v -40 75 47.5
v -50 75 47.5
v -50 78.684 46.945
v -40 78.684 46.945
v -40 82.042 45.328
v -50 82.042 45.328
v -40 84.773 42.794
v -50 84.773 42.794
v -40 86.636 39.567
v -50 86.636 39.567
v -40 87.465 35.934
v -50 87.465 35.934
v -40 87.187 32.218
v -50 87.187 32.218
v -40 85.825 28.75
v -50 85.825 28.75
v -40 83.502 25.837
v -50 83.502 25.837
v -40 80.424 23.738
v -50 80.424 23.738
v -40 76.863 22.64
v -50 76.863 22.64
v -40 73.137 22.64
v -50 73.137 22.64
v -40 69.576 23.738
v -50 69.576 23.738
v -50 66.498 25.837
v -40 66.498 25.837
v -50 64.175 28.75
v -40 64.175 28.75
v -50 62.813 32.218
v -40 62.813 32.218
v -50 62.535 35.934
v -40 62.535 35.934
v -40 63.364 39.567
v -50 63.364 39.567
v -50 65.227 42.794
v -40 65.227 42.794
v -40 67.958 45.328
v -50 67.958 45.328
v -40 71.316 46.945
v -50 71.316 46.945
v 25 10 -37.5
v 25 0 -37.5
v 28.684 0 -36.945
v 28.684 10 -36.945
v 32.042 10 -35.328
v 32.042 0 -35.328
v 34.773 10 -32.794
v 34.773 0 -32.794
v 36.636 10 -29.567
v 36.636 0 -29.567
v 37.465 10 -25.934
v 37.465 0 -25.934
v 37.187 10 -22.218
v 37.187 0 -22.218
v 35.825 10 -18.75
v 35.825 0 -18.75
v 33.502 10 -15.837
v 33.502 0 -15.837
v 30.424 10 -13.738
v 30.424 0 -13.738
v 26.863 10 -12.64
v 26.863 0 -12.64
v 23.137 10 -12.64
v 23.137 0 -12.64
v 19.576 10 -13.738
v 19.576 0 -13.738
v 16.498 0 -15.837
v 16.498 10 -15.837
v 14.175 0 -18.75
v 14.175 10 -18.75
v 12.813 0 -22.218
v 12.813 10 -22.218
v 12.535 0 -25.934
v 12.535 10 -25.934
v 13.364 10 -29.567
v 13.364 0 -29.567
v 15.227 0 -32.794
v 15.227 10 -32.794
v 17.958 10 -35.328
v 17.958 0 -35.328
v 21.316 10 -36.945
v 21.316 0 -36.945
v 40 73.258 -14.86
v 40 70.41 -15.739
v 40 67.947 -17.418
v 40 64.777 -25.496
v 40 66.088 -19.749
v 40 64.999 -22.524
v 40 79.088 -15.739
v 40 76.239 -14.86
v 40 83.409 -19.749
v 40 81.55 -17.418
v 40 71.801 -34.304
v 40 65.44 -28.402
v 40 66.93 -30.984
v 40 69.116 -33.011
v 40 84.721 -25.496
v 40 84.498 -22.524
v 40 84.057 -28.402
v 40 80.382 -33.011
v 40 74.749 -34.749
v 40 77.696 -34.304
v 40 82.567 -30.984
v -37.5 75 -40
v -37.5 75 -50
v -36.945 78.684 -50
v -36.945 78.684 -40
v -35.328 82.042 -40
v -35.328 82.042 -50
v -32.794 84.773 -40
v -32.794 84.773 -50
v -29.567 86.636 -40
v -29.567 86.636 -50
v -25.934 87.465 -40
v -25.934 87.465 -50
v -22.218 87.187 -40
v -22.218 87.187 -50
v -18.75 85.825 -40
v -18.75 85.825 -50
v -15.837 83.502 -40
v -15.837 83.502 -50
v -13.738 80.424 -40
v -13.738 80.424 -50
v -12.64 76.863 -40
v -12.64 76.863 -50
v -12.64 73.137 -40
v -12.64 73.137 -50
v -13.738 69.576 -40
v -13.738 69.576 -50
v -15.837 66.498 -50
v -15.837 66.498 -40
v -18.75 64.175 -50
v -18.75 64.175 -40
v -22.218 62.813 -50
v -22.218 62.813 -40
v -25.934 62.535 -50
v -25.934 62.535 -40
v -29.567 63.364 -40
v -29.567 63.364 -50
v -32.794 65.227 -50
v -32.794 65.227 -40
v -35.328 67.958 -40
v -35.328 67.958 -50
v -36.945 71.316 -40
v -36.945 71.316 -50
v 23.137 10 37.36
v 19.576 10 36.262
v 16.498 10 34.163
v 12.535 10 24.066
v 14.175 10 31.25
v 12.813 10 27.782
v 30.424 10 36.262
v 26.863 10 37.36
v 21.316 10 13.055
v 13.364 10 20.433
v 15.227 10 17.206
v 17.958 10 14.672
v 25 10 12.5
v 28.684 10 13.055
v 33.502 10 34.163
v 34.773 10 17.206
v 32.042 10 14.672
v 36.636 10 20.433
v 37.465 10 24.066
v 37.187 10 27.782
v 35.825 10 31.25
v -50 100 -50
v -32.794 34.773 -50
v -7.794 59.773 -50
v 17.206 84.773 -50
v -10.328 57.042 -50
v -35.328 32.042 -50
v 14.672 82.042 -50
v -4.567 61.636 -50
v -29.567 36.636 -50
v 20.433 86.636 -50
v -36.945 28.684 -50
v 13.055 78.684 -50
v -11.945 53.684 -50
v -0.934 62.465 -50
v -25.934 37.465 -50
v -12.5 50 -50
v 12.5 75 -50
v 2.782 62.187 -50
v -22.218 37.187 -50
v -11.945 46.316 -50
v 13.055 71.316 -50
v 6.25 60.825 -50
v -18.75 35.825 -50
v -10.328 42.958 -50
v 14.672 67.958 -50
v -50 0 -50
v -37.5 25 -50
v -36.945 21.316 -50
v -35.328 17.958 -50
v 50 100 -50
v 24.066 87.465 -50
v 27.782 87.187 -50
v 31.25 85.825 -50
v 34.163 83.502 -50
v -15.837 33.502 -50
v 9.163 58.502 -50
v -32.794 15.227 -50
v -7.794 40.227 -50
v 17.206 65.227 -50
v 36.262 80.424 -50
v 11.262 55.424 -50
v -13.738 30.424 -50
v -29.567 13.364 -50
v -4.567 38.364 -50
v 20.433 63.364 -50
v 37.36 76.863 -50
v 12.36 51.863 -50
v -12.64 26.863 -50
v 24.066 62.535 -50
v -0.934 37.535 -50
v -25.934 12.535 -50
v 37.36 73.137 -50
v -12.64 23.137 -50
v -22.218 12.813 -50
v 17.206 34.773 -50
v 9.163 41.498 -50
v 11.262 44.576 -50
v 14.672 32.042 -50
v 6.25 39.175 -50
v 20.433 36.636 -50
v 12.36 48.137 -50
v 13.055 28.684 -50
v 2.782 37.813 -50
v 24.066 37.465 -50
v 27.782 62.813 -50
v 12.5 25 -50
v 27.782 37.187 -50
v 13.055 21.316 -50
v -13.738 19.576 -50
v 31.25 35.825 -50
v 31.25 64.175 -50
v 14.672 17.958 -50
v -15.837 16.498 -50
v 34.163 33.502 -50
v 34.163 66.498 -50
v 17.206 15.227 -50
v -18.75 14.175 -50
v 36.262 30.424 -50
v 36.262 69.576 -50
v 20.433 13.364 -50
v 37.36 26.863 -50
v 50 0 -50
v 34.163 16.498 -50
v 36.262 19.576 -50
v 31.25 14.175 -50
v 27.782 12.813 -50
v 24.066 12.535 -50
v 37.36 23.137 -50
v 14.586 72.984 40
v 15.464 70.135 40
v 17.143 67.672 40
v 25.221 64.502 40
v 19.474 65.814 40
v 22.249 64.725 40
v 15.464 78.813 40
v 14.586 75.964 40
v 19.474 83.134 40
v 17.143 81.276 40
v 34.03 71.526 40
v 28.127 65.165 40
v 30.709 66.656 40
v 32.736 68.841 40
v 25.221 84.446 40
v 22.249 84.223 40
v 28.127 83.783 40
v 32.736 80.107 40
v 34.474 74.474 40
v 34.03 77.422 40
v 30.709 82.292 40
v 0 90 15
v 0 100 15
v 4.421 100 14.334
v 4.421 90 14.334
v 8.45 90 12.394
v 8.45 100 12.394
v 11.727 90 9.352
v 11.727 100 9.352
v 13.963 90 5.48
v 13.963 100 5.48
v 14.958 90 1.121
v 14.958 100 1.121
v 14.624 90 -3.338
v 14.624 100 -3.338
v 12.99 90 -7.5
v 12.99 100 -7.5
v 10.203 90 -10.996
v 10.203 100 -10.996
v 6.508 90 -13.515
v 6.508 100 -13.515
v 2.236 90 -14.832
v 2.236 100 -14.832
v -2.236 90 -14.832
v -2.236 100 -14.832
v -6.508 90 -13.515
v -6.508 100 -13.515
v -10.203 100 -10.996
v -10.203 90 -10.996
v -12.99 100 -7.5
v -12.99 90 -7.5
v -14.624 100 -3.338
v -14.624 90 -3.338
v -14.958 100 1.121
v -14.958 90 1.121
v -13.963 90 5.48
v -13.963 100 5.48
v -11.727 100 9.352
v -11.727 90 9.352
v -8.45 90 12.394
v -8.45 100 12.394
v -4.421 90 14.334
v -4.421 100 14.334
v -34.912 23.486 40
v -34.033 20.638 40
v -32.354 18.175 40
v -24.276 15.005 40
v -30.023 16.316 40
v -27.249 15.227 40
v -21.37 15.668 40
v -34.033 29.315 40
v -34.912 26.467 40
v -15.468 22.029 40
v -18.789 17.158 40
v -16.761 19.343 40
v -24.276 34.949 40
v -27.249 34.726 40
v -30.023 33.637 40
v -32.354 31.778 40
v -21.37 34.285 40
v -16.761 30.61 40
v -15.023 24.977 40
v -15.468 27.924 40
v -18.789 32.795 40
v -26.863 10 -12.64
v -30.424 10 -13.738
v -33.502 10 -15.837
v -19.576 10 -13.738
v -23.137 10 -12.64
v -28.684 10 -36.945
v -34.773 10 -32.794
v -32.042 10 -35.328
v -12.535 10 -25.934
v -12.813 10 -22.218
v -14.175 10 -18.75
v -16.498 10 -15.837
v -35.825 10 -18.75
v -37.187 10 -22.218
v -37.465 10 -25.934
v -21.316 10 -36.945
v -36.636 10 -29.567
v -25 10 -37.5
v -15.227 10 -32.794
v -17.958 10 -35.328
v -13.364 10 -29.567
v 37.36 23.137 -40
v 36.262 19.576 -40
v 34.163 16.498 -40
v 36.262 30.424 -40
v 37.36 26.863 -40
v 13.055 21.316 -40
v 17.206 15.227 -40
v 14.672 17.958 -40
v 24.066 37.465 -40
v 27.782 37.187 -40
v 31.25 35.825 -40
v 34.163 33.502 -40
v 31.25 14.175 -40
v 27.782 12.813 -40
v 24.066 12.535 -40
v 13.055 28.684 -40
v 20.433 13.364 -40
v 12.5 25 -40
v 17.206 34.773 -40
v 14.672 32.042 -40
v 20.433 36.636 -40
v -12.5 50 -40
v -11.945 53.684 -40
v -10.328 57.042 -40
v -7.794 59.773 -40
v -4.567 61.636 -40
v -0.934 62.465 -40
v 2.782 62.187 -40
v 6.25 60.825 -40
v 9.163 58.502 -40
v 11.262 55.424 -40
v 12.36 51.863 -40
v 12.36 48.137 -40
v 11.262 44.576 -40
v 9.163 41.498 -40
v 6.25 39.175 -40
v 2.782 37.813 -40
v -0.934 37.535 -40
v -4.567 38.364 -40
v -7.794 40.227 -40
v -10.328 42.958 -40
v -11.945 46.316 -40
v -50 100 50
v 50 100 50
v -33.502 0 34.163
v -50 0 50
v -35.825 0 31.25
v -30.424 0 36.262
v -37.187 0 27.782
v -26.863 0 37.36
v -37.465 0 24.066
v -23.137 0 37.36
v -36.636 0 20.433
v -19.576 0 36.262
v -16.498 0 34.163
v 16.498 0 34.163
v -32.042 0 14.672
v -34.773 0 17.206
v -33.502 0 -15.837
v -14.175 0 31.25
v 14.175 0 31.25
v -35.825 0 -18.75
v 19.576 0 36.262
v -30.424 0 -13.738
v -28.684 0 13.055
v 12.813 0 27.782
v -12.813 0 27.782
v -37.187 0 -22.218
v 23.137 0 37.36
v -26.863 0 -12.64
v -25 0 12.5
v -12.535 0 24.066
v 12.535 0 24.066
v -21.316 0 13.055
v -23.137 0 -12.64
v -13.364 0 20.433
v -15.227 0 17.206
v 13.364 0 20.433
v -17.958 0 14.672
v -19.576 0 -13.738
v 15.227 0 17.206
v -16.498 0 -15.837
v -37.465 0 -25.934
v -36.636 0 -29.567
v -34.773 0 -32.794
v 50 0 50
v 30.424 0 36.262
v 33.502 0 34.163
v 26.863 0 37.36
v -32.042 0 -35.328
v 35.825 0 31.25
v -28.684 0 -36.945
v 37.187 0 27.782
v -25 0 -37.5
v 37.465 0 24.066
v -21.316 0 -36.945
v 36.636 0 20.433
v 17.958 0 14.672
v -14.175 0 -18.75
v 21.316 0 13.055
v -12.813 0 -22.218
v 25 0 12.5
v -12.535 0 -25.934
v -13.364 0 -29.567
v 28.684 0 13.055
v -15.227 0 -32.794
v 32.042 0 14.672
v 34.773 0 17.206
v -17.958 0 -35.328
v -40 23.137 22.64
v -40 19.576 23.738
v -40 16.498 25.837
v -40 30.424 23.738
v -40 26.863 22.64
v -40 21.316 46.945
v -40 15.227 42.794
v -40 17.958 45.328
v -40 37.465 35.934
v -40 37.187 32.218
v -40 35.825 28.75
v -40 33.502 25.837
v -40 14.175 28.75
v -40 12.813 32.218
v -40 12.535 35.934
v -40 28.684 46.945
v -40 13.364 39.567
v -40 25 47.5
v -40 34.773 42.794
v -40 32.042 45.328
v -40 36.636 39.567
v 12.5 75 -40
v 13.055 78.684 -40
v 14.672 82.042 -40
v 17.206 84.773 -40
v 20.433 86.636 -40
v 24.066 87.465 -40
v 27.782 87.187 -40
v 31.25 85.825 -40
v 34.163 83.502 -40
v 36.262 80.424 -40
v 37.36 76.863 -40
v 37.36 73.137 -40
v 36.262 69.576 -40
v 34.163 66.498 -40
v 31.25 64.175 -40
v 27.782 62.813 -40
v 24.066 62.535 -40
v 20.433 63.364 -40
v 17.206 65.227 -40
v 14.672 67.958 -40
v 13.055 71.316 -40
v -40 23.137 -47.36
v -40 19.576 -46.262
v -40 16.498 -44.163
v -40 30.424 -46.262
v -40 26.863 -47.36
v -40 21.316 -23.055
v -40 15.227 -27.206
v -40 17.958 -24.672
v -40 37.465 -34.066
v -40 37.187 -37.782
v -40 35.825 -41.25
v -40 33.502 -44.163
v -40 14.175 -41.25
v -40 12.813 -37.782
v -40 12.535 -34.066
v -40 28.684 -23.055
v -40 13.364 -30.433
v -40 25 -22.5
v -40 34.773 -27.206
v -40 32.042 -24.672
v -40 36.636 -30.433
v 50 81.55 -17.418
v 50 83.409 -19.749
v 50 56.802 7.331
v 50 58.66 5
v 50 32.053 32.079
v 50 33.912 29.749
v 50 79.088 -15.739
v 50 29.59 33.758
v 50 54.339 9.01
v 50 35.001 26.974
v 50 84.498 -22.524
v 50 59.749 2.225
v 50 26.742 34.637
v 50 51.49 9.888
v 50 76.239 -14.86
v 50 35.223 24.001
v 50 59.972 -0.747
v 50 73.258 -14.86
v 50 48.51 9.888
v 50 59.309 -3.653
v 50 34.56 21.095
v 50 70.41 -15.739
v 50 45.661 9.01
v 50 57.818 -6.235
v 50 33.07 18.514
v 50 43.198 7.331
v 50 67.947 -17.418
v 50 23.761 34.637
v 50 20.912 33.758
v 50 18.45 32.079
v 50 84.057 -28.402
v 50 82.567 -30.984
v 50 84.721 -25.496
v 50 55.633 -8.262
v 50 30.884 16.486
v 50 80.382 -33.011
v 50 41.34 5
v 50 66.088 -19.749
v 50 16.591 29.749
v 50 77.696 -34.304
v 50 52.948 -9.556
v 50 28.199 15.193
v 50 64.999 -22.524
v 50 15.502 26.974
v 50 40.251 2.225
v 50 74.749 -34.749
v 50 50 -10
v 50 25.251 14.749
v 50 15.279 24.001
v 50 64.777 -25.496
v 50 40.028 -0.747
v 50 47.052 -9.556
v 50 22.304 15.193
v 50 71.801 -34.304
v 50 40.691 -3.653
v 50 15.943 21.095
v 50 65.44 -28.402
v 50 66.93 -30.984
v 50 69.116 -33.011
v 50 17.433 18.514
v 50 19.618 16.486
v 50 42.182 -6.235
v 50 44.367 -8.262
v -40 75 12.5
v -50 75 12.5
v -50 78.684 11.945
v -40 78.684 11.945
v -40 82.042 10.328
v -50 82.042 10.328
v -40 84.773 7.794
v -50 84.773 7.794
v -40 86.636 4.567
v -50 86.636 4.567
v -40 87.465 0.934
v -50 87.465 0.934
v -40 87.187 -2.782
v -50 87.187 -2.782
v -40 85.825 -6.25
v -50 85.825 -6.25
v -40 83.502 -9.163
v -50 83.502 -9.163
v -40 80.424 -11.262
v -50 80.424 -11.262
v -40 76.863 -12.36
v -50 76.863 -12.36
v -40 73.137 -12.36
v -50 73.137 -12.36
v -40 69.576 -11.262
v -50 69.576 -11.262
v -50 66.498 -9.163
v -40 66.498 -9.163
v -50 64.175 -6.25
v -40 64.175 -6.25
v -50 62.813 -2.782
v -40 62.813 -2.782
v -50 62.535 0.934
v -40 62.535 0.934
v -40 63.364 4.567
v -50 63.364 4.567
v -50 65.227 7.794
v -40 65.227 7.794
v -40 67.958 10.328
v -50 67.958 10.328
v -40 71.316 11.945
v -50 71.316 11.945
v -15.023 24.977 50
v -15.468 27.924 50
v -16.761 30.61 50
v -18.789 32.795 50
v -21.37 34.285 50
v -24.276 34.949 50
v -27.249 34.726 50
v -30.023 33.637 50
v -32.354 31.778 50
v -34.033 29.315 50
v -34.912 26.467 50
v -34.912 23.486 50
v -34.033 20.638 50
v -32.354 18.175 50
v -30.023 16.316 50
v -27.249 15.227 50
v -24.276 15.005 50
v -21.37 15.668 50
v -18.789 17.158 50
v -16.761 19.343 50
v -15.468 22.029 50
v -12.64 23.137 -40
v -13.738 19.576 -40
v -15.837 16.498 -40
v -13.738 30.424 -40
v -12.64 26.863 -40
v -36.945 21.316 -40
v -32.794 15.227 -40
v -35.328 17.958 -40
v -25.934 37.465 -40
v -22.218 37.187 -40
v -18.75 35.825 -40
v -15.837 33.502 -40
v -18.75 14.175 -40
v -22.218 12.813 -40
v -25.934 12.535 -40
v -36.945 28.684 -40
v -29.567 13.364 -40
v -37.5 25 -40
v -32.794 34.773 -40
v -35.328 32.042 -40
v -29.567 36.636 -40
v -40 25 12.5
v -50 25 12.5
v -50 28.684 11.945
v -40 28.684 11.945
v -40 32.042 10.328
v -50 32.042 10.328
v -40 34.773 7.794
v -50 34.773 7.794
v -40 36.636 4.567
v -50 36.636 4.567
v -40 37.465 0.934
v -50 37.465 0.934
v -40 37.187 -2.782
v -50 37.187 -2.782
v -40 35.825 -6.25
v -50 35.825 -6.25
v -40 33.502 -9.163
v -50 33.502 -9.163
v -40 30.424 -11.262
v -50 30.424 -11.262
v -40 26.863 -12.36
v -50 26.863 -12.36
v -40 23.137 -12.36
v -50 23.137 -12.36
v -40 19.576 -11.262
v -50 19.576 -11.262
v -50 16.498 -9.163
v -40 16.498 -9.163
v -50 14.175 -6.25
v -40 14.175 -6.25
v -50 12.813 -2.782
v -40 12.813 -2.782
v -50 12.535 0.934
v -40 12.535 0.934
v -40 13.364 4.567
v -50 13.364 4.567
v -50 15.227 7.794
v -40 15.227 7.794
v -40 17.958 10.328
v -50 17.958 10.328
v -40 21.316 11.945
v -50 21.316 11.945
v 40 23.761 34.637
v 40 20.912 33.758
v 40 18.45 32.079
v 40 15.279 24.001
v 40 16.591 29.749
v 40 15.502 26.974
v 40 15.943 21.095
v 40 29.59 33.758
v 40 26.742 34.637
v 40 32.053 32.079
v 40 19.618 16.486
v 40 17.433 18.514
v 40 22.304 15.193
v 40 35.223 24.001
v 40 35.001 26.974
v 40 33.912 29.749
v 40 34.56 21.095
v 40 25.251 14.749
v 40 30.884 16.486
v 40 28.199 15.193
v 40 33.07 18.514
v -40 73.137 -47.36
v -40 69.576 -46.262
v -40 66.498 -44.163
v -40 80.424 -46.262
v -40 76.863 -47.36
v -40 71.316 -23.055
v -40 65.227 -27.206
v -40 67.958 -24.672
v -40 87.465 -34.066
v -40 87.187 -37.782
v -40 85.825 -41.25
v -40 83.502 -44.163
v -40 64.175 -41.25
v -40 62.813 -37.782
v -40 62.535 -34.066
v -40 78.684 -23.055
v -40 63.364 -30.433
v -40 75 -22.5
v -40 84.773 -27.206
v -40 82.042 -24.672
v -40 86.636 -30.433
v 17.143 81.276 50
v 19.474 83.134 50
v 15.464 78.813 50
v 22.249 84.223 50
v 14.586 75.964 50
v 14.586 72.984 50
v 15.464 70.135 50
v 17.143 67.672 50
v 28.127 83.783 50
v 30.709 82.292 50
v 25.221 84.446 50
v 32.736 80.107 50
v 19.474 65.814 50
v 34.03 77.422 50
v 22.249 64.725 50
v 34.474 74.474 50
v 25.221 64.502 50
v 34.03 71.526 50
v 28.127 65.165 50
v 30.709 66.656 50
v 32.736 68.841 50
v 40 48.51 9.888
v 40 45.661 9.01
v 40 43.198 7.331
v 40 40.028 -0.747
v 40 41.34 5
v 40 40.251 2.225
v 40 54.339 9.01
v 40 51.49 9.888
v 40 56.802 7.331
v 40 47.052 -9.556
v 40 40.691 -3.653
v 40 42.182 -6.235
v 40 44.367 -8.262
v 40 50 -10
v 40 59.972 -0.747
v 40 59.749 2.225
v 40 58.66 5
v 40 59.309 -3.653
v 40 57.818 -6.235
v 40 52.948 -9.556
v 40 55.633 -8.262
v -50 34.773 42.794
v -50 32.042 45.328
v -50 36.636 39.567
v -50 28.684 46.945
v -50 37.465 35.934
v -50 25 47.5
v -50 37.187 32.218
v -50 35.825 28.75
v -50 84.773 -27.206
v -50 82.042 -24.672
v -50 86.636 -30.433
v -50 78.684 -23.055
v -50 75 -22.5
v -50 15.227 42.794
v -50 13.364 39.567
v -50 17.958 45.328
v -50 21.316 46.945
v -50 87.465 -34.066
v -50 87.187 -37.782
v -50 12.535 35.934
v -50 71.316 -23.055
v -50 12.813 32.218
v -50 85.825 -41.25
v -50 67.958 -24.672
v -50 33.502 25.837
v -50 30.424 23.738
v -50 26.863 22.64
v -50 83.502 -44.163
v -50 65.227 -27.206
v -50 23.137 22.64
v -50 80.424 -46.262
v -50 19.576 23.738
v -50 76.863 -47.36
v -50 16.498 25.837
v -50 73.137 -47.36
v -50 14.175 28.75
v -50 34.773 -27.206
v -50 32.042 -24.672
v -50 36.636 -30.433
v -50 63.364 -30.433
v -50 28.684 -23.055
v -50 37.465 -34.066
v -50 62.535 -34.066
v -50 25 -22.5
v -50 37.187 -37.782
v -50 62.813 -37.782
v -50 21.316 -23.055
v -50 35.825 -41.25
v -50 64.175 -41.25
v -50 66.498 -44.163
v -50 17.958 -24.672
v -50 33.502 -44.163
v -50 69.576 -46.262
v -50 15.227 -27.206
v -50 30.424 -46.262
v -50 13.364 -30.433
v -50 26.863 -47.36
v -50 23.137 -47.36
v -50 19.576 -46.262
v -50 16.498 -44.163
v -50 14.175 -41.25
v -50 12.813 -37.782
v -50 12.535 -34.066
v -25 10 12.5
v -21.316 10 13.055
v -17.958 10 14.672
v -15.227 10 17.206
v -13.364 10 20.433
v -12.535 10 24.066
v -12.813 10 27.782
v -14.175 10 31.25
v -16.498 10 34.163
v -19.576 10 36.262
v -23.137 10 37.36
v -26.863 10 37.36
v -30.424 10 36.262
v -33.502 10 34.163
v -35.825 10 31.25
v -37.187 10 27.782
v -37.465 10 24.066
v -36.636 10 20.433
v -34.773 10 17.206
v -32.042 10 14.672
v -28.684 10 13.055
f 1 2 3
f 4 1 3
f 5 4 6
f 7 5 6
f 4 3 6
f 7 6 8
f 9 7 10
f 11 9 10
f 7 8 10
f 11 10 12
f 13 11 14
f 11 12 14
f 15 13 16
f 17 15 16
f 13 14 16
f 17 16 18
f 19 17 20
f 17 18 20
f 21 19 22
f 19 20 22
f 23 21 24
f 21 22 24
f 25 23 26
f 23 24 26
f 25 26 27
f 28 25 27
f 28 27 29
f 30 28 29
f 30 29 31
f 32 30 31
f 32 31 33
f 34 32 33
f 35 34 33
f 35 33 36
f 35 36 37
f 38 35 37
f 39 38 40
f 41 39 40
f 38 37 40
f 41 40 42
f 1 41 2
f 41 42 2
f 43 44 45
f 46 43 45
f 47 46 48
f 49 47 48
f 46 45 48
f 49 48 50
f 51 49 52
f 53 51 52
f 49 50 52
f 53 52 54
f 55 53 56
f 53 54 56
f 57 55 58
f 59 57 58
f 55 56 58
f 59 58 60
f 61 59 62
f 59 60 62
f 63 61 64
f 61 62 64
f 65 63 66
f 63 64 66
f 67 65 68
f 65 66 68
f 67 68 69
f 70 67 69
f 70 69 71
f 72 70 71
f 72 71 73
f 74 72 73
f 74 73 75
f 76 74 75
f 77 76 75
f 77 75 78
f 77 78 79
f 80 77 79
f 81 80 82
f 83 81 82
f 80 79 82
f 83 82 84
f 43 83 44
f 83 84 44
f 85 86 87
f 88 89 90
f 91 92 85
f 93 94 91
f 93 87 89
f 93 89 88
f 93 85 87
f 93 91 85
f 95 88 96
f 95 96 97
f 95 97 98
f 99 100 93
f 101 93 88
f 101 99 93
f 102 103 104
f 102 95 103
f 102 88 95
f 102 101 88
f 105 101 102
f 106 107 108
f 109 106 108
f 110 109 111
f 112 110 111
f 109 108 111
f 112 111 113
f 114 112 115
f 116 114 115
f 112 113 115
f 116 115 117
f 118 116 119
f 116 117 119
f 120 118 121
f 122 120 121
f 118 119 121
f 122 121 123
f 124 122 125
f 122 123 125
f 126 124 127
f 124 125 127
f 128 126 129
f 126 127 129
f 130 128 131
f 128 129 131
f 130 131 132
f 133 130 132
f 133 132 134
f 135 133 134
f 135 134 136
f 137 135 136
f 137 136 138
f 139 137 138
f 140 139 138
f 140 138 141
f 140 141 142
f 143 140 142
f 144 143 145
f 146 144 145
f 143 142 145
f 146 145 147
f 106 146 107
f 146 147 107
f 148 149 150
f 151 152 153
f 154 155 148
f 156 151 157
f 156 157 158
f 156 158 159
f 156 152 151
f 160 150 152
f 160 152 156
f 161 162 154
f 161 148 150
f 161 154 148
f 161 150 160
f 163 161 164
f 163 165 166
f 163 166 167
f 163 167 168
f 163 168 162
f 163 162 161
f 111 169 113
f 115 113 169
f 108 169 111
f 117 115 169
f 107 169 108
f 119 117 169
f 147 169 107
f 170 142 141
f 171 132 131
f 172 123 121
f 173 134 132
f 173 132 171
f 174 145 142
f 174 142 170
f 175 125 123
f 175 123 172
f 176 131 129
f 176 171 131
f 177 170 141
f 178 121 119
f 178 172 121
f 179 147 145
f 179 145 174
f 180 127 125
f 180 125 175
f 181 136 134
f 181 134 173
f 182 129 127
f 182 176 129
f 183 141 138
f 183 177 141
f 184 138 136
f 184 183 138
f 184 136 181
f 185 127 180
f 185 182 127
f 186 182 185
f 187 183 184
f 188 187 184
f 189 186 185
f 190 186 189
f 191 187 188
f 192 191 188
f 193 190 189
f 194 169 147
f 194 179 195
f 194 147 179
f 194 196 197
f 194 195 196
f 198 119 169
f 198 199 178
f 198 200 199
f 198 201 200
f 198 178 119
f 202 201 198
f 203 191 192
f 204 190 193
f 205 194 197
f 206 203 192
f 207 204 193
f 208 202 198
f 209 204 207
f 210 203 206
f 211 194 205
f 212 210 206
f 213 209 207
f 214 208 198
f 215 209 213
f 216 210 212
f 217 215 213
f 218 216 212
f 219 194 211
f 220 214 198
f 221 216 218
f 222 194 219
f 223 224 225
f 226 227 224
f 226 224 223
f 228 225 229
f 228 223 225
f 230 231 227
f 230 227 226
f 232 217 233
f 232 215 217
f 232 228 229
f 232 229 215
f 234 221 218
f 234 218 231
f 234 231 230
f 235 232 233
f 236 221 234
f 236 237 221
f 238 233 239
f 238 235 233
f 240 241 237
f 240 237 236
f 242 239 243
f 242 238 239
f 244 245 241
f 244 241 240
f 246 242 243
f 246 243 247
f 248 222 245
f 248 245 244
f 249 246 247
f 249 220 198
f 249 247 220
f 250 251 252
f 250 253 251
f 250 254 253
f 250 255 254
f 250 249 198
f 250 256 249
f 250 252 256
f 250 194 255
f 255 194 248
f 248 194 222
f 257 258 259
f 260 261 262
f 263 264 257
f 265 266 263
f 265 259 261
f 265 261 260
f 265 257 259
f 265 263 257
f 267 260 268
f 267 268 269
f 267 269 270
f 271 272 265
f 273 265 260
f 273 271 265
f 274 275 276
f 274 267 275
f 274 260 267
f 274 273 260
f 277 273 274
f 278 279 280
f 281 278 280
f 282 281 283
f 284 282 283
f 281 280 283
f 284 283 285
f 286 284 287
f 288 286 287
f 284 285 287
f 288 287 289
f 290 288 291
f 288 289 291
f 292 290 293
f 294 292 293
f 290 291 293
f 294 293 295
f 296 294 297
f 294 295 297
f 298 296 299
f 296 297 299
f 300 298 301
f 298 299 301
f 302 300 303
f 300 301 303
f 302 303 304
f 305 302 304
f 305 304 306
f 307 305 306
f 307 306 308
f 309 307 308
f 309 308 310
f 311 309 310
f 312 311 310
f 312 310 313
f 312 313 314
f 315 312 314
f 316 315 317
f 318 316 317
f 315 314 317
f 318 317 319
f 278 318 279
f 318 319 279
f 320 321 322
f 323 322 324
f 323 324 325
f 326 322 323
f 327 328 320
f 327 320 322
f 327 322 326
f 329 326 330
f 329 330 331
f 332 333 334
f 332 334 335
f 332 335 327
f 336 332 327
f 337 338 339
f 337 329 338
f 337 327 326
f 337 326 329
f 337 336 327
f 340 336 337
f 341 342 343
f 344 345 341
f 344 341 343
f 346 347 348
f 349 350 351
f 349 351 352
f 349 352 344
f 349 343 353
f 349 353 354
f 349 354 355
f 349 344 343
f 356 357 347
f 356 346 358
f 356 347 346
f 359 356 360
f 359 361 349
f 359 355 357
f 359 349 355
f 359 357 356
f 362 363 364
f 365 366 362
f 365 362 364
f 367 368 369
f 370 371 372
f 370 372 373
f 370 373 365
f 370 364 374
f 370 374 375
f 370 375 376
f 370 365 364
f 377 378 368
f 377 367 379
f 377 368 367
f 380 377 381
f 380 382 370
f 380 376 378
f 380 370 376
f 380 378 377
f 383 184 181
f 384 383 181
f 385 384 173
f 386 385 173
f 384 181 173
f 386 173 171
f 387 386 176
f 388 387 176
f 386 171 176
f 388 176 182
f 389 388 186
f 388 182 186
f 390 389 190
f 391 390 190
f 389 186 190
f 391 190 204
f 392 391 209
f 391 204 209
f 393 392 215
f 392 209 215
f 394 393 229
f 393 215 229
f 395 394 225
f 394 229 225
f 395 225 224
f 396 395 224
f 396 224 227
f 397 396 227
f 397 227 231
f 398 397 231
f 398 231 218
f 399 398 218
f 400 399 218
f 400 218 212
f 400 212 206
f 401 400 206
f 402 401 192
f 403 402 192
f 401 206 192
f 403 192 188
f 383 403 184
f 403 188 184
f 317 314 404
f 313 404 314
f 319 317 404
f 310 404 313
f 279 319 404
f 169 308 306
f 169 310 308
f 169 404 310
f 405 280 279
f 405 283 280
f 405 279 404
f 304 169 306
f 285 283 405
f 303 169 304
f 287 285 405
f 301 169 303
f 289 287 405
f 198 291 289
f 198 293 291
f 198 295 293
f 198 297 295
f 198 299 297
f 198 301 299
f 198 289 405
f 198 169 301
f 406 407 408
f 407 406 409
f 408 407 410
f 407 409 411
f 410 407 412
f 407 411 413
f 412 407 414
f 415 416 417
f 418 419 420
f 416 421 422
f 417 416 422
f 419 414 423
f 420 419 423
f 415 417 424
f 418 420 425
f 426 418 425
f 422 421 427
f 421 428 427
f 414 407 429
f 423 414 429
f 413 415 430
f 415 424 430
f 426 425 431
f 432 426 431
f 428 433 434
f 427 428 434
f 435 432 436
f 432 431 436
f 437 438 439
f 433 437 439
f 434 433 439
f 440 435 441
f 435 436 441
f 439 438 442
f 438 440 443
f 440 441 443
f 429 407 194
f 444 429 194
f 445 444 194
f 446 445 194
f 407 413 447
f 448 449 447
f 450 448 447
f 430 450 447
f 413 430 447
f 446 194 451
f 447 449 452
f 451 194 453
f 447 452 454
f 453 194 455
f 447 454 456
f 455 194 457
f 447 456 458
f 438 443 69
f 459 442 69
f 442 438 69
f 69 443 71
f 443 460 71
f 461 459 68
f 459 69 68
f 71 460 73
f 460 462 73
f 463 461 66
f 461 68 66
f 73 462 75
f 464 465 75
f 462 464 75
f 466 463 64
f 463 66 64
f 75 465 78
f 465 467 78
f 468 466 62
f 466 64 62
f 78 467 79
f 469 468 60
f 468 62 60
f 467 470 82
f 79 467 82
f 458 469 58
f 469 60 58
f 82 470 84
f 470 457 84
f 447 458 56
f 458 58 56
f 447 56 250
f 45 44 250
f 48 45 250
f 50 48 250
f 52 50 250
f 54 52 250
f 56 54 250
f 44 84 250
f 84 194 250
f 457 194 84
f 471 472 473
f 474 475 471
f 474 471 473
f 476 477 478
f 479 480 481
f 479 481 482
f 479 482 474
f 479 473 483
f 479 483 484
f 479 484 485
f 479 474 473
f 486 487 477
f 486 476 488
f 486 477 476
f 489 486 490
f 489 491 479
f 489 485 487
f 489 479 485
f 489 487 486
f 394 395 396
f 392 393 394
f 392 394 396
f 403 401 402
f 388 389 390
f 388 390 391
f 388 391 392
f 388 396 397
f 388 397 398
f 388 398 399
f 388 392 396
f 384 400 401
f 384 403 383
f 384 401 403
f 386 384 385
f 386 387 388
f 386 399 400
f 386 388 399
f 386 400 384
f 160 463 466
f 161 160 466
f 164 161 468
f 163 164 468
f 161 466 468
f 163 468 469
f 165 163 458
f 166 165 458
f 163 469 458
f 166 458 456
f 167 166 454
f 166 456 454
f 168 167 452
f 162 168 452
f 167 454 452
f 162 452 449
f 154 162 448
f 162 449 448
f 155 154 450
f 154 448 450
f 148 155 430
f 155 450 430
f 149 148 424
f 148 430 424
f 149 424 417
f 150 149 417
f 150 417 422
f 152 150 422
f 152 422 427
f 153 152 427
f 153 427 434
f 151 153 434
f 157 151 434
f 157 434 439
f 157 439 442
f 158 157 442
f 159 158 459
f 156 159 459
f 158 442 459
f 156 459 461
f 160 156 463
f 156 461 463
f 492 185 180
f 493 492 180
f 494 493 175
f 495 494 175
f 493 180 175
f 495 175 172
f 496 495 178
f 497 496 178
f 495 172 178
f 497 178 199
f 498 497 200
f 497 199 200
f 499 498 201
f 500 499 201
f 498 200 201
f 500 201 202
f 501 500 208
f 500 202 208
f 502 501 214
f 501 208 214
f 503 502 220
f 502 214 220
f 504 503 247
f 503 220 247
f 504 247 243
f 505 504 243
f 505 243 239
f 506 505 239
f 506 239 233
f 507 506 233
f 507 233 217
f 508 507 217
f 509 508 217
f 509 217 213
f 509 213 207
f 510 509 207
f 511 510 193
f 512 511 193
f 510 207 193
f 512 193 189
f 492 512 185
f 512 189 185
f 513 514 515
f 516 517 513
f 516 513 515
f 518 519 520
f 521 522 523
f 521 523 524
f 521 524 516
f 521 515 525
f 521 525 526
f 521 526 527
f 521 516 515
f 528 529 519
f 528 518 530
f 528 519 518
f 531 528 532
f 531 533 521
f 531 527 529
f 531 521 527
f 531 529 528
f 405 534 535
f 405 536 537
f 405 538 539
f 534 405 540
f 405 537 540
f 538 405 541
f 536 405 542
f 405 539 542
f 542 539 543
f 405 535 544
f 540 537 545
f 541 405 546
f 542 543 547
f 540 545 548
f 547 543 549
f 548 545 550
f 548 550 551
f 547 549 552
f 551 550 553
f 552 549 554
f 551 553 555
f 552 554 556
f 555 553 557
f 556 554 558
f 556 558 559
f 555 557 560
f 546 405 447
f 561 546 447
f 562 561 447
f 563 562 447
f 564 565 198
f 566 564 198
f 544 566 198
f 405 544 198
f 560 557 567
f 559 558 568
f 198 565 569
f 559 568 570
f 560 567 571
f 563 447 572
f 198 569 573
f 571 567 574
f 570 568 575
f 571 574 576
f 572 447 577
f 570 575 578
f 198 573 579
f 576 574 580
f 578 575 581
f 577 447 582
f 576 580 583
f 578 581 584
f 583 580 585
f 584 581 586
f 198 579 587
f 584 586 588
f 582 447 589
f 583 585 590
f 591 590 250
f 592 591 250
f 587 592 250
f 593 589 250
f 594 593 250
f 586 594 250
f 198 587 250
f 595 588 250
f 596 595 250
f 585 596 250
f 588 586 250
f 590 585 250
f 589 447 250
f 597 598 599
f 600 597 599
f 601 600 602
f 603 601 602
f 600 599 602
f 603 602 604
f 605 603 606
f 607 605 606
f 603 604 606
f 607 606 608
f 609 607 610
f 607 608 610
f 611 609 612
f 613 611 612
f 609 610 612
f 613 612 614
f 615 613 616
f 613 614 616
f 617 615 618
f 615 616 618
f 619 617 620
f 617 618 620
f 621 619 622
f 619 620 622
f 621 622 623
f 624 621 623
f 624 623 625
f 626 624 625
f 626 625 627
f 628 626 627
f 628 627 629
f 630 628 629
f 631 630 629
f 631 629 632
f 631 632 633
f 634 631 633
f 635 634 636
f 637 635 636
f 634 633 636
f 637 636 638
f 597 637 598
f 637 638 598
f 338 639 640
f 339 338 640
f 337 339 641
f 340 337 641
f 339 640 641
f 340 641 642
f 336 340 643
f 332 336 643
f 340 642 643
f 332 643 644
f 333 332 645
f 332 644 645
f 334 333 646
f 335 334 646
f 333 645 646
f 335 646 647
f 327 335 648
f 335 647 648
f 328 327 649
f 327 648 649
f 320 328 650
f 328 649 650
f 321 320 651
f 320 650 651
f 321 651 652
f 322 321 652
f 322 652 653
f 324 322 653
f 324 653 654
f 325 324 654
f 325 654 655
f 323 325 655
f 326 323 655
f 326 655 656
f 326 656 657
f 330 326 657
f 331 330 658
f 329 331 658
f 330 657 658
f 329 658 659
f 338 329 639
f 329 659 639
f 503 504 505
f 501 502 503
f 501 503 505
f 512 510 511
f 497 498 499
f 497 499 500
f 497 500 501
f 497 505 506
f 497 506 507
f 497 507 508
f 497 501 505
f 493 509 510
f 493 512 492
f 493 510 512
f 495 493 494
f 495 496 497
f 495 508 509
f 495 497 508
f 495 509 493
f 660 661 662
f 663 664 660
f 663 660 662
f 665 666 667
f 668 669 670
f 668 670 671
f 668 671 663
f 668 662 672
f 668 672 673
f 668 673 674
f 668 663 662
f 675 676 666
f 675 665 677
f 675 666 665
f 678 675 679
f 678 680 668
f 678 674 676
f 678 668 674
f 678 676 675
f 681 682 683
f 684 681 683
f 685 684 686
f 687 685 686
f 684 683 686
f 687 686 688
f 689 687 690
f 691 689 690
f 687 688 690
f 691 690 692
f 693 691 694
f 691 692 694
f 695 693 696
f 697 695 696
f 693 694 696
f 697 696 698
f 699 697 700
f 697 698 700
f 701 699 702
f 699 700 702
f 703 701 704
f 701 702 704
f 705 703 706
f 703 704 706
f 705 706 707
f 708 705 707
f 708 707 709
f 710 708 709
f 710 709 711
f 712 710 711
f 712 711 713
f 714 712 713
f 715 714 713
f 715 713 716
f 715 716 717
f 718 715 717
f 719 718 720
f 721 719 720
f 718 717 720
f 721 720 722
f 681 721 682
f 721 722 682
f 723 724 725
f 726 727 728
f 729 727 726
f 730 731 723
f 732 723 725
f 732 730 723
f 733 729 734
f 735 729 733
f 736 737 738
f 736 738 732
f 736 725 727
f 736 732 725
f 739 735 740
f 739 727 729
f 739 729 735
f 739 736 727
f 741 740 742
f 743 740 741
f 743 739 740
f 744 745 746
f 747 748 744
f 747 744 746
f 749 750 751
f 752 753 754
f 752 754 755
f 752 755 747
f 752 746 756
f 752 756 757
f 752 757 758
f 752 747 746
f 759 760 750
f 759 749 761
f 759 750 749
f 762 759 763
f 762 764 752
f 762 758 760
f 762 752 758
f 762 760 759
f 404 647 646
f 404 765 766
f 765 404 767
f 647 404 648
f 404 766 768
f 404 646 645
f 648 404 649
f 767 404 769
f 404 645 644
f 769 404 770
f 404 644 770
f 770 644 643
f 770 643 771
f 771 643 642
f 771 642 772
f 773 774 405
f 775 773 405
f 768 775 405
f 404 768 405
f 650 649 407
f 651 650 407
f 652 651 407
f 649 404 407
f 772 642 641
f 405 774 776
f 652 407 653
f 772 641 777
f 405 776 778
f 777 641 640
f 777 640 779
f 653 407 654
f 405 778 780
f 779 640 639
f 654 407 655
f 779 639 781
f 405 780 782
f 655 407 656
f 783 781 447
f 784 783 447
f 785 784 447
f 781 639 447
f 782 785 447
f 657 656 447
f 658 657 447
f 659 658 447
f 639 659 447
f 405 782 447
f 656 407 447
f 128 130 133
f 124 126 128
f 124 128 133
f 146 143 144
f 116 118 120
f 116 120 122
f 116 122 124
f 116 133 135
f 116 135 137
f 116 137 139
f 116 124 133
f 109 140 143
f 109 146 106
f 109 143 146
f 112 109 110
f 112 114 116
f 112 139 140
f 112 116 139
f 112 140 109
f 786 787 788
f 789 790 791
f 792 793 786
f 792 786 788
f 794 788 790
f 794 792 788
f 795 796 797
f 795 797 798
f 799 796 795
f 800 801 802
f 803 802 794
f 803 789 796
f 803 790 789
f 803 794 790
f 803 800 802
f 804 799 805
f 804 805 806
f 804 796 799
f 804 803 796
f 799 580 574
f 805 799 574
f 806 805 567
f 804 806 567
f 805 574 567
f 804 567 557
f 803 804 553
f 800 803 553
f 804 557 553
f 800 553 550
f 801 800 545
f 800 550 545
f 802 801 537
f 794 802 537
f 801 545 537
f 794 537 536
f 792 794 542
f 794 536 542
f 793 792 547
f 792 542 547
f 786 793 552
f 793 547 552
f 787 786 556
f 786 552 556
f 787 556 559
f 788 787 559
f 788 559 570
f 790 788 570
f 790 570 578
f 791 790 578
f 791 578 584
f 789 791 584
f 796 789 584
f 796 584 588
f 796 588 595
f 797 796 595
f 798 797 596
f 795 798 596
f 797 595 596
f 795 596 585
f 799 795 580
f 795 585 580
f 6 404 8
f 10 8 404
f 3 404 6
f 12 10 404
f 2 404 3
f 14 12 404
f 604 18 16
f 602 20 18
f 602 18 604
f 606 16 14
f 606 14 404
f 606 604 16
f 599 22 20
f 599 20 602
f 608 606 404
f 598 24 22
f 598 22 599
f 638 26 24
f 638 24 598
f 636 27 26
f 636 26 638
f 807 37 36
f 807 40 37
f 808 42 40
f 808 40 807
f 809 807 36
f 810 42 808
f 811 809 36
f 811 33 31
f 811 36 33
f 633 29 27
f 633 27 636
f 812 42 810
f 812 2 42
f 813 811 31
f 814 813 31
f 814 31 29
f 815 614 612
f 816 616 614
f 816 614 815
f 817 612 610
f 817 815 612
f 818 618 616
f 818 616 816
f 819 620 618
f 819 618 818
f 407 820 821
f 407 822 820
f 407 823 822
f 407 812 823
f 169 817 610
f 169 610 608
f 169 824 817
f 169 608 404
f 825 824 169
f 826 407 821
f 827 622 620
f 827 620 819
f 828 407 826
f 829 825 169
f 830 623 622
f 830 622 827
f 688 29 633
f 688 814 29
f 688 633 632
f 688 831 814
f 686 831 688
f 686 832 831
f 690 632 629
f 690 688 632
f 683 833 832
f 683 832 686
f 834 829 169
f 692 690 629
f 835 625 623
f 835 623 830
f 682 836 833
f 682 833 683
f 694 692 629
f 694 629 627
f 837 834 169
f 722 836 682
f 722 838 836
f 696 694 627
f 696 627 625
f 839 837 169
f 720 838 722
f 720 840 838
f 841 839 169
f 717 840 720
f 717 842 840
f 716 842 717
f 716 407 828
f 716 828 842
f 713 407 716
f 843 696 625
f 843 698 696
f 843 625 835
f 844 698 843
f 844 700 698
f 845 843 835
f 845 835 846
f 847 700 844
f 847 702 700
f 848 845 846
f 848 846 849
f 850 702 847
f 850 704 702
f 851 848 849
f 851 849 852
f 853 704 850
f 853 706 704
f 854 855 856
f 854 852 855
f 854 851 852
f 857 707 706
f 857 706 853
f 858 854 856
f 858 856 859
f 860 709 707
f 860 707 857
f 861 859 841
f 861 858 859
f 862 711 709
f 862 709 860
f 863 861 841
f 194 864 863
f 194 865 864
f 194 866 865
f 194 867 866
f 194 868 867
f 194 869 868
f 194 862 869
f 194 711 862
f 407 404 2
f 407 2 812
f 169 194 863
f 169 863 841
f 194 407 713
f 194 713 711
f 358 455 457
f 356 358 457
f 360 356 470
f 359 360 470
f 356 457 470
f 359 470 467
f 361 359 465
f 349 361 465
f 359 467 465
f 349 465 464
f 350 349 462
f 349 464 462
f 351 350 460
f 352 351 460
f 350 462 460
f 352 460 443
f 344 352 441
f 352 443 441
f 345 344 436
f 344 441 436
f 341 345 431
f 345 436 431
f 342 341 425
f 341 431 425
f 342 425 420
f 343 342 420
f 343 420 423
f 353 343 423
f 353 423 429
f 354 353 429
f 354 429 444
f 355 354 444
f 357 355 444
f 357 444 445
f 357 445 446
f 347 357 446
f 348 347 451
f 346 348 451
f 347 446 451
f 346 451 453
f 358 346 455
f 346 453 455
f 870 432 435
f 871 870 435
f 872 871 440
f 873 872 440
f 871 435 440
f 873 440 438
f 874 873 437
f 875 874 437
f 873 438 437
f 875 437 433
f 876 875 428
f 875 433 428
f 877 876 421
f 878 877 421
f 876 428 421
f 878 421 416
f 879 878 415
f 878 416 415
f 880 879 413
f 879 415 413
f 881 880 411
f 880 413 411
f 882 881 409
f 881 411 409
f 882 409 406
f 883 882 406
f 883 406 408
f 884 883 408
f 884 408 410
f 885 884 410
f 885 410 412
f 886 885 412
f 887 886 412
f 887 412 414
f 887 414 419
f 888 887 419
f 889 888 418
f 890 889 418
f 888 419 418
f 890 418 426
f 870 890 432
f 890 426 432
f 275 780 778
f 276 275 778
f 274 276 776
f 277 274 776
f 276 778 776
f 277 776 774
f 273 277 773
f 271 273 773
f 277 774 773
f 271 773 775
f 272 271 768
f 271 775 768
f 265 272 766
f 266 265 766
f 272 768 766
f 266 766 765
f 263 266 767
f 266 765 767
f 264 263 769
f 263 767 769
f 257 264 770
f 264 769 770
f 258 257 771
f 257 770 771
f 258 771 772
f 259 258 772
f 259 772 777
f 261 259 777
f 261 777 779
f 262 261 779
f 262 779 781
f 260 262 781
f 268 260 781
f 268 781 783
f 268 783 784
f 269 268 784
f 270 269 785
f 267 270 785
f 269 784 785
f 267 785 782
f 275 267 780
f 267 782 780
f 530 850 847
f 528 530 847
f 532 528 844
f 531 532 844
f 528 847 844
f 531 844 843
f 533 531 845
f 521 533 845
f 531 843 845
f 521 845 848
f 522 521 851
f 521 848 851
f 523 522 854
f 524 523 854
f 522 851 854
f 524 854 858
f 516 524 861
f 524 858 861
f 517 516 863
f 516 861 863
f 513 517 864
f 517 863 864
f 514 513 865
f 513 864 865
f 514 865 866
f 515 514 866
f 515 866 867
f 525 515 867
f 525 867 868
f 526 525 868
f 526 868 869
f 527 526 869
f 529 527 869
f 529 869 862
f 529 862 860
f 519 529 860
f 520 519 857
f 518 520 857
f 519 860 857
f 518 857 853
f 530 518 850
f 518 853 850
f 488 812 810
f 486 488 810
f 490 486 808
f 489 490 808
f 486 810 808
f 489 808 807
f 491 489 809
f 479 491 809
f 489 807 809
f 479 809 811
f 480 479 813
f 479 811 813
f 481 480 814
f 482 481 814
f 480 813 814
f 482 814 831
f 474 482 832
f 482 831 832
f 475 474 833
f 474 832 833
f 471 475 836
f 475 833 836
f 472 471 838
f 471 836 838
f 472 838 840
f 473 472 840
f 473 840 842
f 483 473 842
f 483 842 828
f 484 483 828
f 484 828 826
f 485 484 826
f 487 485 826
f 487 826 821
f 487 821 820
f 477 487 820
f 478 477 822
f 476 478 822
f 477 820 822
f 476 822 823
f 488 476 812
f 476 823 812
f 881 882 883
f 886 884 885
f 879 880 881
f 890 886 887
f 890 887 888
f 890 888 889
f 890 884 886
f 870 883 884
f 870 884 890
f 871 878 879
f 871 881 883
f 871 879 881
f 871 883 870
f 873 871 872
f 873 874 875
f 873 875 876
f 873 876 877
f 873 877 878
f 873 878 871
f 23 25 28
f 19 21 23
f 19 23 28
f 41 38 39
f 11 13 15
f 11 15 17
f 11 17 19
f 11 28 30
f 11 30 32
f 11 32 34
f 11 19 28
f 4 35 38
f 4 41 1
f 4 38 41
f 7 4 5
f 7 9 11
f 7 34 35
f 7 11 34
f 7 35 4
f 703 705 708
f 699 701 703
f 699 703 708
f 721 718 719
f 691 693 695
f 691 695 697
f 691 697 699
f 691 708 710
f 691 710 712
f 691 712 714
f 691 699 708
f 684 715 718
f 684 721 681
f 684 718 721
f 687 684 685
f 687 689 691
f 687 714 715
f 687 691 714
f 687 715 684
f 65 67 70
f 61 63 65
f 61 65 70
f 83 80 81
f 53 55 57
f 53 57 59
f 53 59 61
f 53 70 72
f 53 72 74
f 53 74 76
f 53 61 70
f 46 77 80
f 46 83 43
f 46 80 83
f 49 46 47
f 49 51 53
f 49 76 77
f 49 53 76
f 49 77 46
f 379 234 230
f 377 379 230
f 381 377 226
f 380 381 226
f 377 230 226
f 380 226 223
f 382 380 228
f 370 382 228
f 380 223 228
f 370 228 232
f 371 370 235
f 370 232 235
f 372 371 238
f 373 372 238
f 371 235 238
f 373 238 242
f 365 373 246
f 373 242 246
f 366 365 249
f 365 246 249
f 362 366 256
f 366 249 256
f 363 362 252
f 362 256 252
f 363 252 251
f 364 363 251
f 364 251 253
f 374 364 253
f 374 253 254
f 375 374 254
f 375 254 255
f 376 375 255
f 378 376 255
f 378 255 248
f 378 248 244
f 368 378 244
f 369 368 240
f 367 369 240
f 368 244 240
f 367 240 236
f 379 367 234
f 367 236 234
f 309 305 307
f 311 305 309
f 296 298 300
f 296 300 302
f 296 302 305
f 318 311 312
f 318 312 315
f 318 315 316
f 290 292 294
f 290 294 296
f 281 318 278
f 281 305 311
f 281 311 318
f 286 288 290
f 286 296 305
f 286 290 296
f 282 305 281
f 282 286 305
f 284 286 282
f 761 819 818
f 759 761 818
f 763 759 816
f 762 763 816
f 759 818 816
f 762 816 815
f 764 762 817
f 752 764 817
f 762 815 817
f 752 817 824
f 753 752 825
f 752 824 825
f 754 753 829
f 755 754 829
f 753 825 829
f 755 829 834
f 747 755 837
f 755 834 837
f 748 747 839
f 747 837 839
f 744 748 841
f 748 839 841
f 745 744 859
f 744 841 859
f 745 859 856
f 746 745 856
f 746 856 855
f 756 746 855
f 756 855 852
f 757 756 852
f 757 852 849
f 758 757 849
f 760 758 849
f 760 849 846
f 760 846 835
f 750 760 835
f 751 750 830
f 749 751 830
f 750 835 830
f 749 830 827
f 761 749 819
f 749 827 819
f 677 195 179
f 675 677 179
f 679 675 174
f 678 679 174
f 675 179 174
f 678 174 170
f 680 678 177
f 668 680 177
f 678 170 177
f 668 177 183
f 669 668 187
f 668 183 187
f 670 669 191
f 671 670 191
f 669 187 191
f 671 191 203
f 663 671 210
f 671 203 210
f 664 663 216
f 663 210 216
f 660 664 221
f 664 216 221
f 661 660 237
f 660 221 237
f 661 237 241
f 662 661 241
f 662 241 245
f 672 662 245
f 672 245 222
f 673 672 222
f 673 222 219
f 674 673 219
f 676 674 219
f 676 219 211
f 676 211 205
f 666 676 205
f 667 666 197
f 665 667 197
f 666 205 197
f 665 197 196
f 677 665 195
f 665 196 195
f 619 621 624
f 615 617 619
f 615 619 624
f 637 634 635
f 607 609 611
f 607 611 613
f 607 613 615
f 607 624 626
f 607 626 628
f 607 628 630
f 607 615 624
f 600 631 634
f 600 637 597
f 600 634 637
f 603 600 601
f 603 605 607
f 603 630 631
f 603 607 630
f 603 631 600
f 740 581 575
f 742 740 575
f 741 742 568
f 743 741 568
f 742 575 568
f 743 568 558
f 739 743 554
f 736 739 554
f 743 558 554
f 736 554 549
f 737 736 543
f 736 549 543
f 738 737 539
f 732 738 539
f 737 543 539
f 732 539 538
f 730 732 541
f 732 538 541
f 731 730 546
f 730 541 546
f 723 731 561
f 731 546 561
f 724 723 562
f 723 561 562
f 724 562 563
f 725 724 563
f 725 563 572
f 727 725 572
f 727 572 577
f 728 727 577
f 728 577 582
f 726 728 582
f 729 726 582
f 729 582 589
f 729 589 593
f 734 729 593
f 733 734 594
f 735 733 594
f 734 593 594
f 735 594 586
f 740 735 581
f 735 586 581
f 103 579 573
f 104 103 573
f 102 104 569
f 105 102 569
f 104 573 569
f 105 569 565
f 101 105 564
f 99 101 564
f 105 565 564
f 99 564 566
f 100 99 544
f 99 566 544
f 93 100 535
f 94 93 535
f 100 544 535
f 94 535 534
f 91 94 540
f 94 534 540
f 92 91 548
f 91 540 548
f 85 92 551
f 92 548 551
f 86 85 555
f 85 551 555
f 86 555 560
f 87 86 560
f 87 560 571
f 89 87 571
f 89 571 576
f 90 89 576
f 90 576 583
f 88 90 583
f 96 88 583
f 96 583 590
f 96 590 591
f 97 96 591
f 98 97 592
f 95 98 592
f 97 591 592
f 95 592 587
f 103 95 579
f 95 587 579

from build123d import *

# Parameters (mm, degrees)
SKETCH7_W           = 100
SKETCH7_H           = 100
BOSS_EXTRUDE1_DEPTH = 100
SKETCH8_R           = 15
CUT_EXTRUDE1_DEPTH  = 10
SKETCH9_R           = 10
CUT_EXTRUDE2_DEPTH  = 10
SKETCH10_R          = 10
CUT_EXTRUDE3_DEPTH  = 10
SKETCH13_R          = 12.5
CUT_EXTRUDE4_DEPTH  = 10
SKETCH14_R          = 12.5
CUT_EXTRUDE5_DEPTH  = 10
SKETCH16_R          = 12.5
CUT_EXTRUDE11_DEPTH = 10


with BuildPart() as part:
    # Sketch7 → Boss-Extrude1 (new body)
    with BuildSketch(Plane(origin=(0, 0, 0), x_dir=(1, 0, 0), z_dir=(0, 1, 0))):
        Rectangle(SKETCH7_W, SKETCH7_H)
    extrude(amount=BOSS_EXTRUDE1_DEPTH)

    # Sketch8 → Cut-Extrude1 (cut)
    with BuildSketch(Plane(origin=(0, 100, 0), x_dir=(1, 0, 0), z_dir=(0, 1, 0))):
        with Locations(Location((0, 0, 0), (0, 0, 270))):
            Circle(SKETCH8_R)
    extrude(amount=-CUT_EXTRUDE1_DEPTH, mode=Mode.SUBTRACT)

    # Sketch9 → Cut-Extrude2 (cut)
    with BuildSketch(Plane(origin=(50, 0, 0), x_dir=(0, 0, -1), z_dir=(1, 0, 0))):
        with Locations((0, 50)):
            Circle(SKETCH9_R)
        with Locations((24.748737342, 74.748737342)):
            Circle(SKETCH9_R)
        with Locations((-24.748737342, 25.251262658)):
            Circle(SKETCH9_R)
    extrude(amount=-CUT_EXTRUDE2_DEPTH, mode=Mode.SUBTRACT)

    # Sketch10 → Cut-Extrude3 (cut)
    with BuildSketch(Plane.XY.offset(50)):
        with Locations((-25.023456699, 24.976543301)):
            Circle(SKETCH10_R)
        with Locations((24.474017984, 74.474017984)):
            Circle(SKETCH10_R)
    extrude(amount=-CUT_EXTRUDE3_DEPTH, mode=Mode.SUBTRACT)

    # Sketch13 → Cut-Extrude4 (cut)
    with BuildSketch(Plane(origin=(0, 0, 0), x_dir=(-1, 0, 0), z_dir=(0, -1, 0))):
        with Locations(Location((25, -25, 0), (0, 0, 90))):
            Circle(SKETCH13_R)
        with Locations(Location((-25, -25, 0), (0, 0, 90))):
            Circle(SKETCH13_R)
        with Locations(Location((25, 25, 0), (0, 0, 90))):
            Circle(SKETCH13_R)
        with Locations(Location((-25, 25, 0), (0, 0, 90))):
            Circle(SKETCH13_R)
    extrude(amount=-CUT_EXTRUDE4_DEPTH, mode=Mode.SUBTRACT)

    # Sketch14 → Cut-Extrude5 (cut)
    with BuildSketch(Plane(origin=(0, 0, -50), x_dir=(-1, 0, 0), z_dir=(0, 0, -1))):
        with Locations((25, 25)):
            Circle(SKETCH14_R)
        with Locations((-25, 25)):
            Circle(SKETCH14_R)
        with Locations((25, 75)):
            Circle(SKETCH14_R)
        with Locations((-25, 75)):
            Circle(SKETCH14_R)
        with Locations((0, 50)):
            Circle(SKETCH14_R)
    extrude(amount=-CUT_EXTRUDE5_DEPTH, mode=Mode.SUBTRACT)

    # Sketch16 → Cut-Extrude11 (cut)
    with BuildSketch(Plane.ZY.offset(50)):
        with Locations((-35, 75)):
            Circle(SKETCH16_R)
        with Locations((0, 75)):
            Circle(SKETCH16_R)
        with Locations((35, 75)):
            Circle(SKETCH16_R)
        with Locations((-35, 25)):
            Circle(SKETCH16_R)
        with Locations((0, 25)):
            Circle(SKETCH16_R)
        with Locations((35, 25)):
            Circle(SKETCH16_R)
    extrude(amount=-CUT_EXTRUDE11_DEPTH, mode=Mode.SUBTRACT)


solid = part.part
